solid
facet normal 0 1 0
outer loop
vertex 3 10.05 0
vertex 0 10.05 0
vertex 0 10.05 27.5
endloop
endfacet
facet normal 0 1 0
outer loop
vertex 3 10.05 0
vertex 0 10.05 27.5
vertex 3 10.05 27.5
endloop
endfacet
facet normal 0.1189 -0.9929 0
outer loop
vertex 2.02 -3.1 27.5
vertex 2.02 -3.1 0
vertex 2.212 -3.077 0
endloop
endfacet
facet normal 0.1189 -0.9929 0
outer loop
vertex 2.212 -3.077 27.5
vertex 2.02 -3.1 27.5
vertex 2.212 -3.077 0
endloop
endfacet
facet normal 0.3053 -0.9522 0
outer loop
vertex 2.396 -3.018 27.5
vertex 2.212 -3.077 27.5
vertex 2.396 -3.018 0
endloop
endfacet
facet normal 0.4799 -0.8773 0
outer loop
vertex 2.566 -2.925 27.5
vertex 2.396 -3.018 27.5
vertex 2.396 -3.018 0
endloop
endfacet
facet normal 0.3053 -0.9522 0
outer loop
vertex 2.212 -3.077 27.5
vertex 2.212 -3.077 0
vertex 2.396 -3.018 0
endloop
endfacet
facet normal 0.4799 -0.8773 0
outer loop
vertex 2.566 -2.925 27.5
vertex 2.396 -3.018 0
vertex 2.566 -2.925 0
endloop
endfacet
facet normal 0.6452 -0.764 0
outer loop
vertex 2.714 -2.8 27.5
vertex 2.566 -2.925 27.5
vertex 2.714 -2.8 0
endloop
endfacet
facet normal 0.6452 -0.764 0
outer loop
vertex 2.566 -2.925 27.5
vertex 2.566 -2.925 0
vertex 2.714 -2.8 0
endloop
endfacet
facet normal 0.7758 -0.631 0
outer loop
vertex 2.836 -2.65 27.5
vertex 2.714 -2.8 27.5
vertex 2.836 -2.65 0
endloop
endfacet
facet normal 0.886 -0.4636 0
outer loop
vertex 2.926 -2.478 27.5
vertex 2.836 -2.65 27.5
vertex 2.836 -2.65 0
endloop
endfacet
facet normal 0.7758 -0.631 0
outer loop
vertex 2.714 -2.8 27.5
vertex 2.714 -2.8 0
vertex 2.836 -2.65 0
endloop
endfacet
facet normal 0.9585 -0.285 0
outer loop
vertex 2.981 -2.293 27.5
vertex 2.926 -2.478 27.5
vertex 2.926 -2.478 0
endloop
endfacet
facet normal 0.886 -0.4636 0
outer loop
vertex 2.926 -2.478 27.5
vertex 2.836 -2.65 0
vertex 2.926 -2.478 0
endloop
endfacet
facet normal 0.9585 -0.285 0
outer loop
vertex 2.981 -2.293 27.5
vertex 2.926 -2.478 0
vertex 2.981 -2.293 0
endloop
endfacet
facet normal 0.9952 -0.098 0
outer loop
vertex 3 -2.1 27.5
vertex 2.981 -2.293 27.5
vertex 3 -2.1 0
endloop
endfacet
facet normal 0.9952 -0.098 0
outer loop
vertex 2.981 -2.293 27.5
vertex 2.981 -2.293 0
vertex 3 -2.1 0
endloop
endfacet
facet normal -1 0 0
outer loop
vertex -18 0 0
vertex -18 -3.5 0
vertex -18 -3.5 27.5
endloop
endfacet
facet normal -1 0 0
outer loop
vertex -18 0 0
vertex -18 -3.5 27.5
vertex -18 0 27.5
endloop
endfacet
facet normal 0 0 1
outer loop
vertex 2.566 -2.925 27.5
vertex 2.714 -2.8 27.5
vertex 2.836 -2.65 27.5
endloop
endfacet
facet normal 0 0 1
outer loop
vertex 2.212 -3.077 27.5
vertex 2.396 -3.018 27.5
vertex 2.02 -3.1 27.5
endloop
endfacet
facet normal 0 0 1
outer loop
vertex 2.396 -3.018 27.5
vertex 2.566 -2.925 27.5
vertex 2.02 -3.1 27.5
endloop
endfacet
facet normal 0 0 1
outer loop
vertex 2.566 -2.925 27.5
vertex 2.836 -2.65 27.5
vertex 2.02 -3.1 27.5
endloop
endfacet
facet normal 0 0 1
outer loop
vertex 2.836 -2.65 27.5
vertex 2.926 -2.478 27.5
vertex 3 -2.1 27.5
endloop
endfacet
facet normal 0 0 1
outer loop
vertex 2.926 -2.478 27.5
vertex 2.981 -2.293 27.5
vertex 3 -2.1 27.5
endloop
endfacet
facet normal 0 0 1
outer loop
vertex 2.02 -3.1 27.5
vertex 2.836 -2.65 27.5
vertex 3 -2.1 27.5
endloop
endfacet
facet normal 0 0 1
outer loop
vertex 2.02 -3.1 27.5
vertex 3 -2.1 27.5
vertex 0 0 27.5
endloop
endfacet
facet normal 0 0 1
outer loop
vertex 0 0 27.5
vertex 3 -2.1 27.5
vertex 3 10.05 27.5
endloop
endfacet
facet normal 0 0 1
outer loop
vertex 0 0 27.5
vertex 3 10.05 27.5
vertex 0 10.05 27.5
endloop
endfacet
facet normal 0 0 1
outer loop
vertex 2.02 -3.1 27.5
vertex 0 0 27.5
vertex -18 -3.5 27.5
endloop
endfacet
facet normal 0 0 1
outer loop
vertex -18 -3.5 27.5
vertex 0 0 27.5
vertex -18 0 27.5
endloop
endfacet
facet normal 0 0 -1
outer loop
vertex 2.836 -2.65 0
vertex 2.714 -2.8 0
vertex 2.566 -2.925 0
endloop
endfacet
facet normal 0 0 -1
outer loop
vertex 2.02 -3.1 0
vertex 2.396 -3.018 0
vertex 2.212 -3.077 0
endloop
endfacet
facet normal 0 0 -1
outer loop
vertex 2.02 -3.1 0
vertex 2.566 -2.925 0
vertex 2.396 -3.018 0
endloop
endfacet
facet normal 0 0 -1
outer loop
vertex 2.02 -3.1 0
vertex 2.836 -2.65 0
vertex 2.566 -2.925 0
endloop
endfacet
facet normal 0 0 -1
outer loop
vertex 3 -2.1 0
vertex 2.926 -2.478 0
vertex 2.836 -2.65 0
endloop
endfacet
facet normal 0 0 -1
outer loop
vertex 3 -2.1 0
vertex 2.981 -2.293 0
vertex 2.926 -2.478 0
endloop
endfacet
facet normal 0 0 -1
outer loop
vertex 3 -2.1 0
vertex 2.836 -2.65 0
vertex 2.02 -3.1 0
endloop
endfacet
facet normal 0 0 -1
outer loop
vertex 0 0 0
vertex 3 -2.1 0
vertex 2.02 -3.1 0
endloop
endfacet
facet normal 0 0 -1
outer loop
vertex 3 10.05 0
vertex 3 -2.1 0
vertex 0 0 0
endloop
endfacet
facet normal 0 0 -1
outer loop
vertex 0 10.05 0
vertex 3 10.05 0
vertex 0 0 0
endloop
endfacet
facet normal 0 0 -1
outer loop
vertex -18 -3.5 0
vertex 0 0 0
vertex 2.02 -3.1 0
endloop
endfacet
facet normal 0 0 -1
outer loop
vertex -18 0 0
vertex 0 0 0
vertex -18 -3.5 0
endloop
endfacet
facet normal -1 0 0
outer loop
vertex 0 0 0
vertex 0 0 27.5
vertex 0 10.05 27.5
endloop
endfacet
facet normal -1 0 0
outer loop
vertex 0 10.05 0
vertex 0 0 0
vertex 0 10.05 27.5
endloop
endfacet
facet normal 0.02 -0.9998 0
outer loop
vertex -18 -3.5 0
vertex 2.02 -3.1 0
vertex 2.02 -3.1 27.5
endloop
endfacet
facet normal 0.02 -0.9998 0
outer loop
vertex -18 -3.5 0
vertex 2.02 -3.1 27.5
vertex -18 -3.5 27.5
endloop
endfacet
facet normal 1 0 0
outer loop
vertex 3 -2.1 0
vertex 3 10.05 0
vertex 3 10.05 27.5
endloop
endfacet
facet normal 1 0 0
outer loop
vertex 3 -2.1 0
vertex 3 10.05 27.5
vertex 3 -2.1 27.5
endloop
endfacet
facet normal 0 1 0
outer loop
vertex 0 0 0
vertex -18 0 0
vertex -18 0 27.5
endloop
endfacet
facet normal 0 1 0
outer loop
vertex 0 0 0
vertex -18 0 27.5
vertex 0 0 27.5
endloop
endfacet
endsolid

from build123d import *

# Parameters (mm, degrees)
PAD_DEPTH = 27.5


with BuildPart() as part:
    # Sketch → Pad (new body)
    with BuildSketch(Plane.XY):
        with BuildLine():
            Line((0, 0), (0, 10.0498))
            Line((0, 10.0498), (3, 10.0498))
            Line((3, 10.0498), (3, -2.1002))
            ThreePointArc((2.019976, -3.1), (2.714134, -2.800208), (3, -2.1002))
            Line((2.019976, -3.1), (-18, -3.5))
            Line((-18, -3.5), (-18, 0))
            Line((-18, 0), (0, 0))
        make_face()
    extrude(amount=PAD_DEPTH)


solid = part.part
